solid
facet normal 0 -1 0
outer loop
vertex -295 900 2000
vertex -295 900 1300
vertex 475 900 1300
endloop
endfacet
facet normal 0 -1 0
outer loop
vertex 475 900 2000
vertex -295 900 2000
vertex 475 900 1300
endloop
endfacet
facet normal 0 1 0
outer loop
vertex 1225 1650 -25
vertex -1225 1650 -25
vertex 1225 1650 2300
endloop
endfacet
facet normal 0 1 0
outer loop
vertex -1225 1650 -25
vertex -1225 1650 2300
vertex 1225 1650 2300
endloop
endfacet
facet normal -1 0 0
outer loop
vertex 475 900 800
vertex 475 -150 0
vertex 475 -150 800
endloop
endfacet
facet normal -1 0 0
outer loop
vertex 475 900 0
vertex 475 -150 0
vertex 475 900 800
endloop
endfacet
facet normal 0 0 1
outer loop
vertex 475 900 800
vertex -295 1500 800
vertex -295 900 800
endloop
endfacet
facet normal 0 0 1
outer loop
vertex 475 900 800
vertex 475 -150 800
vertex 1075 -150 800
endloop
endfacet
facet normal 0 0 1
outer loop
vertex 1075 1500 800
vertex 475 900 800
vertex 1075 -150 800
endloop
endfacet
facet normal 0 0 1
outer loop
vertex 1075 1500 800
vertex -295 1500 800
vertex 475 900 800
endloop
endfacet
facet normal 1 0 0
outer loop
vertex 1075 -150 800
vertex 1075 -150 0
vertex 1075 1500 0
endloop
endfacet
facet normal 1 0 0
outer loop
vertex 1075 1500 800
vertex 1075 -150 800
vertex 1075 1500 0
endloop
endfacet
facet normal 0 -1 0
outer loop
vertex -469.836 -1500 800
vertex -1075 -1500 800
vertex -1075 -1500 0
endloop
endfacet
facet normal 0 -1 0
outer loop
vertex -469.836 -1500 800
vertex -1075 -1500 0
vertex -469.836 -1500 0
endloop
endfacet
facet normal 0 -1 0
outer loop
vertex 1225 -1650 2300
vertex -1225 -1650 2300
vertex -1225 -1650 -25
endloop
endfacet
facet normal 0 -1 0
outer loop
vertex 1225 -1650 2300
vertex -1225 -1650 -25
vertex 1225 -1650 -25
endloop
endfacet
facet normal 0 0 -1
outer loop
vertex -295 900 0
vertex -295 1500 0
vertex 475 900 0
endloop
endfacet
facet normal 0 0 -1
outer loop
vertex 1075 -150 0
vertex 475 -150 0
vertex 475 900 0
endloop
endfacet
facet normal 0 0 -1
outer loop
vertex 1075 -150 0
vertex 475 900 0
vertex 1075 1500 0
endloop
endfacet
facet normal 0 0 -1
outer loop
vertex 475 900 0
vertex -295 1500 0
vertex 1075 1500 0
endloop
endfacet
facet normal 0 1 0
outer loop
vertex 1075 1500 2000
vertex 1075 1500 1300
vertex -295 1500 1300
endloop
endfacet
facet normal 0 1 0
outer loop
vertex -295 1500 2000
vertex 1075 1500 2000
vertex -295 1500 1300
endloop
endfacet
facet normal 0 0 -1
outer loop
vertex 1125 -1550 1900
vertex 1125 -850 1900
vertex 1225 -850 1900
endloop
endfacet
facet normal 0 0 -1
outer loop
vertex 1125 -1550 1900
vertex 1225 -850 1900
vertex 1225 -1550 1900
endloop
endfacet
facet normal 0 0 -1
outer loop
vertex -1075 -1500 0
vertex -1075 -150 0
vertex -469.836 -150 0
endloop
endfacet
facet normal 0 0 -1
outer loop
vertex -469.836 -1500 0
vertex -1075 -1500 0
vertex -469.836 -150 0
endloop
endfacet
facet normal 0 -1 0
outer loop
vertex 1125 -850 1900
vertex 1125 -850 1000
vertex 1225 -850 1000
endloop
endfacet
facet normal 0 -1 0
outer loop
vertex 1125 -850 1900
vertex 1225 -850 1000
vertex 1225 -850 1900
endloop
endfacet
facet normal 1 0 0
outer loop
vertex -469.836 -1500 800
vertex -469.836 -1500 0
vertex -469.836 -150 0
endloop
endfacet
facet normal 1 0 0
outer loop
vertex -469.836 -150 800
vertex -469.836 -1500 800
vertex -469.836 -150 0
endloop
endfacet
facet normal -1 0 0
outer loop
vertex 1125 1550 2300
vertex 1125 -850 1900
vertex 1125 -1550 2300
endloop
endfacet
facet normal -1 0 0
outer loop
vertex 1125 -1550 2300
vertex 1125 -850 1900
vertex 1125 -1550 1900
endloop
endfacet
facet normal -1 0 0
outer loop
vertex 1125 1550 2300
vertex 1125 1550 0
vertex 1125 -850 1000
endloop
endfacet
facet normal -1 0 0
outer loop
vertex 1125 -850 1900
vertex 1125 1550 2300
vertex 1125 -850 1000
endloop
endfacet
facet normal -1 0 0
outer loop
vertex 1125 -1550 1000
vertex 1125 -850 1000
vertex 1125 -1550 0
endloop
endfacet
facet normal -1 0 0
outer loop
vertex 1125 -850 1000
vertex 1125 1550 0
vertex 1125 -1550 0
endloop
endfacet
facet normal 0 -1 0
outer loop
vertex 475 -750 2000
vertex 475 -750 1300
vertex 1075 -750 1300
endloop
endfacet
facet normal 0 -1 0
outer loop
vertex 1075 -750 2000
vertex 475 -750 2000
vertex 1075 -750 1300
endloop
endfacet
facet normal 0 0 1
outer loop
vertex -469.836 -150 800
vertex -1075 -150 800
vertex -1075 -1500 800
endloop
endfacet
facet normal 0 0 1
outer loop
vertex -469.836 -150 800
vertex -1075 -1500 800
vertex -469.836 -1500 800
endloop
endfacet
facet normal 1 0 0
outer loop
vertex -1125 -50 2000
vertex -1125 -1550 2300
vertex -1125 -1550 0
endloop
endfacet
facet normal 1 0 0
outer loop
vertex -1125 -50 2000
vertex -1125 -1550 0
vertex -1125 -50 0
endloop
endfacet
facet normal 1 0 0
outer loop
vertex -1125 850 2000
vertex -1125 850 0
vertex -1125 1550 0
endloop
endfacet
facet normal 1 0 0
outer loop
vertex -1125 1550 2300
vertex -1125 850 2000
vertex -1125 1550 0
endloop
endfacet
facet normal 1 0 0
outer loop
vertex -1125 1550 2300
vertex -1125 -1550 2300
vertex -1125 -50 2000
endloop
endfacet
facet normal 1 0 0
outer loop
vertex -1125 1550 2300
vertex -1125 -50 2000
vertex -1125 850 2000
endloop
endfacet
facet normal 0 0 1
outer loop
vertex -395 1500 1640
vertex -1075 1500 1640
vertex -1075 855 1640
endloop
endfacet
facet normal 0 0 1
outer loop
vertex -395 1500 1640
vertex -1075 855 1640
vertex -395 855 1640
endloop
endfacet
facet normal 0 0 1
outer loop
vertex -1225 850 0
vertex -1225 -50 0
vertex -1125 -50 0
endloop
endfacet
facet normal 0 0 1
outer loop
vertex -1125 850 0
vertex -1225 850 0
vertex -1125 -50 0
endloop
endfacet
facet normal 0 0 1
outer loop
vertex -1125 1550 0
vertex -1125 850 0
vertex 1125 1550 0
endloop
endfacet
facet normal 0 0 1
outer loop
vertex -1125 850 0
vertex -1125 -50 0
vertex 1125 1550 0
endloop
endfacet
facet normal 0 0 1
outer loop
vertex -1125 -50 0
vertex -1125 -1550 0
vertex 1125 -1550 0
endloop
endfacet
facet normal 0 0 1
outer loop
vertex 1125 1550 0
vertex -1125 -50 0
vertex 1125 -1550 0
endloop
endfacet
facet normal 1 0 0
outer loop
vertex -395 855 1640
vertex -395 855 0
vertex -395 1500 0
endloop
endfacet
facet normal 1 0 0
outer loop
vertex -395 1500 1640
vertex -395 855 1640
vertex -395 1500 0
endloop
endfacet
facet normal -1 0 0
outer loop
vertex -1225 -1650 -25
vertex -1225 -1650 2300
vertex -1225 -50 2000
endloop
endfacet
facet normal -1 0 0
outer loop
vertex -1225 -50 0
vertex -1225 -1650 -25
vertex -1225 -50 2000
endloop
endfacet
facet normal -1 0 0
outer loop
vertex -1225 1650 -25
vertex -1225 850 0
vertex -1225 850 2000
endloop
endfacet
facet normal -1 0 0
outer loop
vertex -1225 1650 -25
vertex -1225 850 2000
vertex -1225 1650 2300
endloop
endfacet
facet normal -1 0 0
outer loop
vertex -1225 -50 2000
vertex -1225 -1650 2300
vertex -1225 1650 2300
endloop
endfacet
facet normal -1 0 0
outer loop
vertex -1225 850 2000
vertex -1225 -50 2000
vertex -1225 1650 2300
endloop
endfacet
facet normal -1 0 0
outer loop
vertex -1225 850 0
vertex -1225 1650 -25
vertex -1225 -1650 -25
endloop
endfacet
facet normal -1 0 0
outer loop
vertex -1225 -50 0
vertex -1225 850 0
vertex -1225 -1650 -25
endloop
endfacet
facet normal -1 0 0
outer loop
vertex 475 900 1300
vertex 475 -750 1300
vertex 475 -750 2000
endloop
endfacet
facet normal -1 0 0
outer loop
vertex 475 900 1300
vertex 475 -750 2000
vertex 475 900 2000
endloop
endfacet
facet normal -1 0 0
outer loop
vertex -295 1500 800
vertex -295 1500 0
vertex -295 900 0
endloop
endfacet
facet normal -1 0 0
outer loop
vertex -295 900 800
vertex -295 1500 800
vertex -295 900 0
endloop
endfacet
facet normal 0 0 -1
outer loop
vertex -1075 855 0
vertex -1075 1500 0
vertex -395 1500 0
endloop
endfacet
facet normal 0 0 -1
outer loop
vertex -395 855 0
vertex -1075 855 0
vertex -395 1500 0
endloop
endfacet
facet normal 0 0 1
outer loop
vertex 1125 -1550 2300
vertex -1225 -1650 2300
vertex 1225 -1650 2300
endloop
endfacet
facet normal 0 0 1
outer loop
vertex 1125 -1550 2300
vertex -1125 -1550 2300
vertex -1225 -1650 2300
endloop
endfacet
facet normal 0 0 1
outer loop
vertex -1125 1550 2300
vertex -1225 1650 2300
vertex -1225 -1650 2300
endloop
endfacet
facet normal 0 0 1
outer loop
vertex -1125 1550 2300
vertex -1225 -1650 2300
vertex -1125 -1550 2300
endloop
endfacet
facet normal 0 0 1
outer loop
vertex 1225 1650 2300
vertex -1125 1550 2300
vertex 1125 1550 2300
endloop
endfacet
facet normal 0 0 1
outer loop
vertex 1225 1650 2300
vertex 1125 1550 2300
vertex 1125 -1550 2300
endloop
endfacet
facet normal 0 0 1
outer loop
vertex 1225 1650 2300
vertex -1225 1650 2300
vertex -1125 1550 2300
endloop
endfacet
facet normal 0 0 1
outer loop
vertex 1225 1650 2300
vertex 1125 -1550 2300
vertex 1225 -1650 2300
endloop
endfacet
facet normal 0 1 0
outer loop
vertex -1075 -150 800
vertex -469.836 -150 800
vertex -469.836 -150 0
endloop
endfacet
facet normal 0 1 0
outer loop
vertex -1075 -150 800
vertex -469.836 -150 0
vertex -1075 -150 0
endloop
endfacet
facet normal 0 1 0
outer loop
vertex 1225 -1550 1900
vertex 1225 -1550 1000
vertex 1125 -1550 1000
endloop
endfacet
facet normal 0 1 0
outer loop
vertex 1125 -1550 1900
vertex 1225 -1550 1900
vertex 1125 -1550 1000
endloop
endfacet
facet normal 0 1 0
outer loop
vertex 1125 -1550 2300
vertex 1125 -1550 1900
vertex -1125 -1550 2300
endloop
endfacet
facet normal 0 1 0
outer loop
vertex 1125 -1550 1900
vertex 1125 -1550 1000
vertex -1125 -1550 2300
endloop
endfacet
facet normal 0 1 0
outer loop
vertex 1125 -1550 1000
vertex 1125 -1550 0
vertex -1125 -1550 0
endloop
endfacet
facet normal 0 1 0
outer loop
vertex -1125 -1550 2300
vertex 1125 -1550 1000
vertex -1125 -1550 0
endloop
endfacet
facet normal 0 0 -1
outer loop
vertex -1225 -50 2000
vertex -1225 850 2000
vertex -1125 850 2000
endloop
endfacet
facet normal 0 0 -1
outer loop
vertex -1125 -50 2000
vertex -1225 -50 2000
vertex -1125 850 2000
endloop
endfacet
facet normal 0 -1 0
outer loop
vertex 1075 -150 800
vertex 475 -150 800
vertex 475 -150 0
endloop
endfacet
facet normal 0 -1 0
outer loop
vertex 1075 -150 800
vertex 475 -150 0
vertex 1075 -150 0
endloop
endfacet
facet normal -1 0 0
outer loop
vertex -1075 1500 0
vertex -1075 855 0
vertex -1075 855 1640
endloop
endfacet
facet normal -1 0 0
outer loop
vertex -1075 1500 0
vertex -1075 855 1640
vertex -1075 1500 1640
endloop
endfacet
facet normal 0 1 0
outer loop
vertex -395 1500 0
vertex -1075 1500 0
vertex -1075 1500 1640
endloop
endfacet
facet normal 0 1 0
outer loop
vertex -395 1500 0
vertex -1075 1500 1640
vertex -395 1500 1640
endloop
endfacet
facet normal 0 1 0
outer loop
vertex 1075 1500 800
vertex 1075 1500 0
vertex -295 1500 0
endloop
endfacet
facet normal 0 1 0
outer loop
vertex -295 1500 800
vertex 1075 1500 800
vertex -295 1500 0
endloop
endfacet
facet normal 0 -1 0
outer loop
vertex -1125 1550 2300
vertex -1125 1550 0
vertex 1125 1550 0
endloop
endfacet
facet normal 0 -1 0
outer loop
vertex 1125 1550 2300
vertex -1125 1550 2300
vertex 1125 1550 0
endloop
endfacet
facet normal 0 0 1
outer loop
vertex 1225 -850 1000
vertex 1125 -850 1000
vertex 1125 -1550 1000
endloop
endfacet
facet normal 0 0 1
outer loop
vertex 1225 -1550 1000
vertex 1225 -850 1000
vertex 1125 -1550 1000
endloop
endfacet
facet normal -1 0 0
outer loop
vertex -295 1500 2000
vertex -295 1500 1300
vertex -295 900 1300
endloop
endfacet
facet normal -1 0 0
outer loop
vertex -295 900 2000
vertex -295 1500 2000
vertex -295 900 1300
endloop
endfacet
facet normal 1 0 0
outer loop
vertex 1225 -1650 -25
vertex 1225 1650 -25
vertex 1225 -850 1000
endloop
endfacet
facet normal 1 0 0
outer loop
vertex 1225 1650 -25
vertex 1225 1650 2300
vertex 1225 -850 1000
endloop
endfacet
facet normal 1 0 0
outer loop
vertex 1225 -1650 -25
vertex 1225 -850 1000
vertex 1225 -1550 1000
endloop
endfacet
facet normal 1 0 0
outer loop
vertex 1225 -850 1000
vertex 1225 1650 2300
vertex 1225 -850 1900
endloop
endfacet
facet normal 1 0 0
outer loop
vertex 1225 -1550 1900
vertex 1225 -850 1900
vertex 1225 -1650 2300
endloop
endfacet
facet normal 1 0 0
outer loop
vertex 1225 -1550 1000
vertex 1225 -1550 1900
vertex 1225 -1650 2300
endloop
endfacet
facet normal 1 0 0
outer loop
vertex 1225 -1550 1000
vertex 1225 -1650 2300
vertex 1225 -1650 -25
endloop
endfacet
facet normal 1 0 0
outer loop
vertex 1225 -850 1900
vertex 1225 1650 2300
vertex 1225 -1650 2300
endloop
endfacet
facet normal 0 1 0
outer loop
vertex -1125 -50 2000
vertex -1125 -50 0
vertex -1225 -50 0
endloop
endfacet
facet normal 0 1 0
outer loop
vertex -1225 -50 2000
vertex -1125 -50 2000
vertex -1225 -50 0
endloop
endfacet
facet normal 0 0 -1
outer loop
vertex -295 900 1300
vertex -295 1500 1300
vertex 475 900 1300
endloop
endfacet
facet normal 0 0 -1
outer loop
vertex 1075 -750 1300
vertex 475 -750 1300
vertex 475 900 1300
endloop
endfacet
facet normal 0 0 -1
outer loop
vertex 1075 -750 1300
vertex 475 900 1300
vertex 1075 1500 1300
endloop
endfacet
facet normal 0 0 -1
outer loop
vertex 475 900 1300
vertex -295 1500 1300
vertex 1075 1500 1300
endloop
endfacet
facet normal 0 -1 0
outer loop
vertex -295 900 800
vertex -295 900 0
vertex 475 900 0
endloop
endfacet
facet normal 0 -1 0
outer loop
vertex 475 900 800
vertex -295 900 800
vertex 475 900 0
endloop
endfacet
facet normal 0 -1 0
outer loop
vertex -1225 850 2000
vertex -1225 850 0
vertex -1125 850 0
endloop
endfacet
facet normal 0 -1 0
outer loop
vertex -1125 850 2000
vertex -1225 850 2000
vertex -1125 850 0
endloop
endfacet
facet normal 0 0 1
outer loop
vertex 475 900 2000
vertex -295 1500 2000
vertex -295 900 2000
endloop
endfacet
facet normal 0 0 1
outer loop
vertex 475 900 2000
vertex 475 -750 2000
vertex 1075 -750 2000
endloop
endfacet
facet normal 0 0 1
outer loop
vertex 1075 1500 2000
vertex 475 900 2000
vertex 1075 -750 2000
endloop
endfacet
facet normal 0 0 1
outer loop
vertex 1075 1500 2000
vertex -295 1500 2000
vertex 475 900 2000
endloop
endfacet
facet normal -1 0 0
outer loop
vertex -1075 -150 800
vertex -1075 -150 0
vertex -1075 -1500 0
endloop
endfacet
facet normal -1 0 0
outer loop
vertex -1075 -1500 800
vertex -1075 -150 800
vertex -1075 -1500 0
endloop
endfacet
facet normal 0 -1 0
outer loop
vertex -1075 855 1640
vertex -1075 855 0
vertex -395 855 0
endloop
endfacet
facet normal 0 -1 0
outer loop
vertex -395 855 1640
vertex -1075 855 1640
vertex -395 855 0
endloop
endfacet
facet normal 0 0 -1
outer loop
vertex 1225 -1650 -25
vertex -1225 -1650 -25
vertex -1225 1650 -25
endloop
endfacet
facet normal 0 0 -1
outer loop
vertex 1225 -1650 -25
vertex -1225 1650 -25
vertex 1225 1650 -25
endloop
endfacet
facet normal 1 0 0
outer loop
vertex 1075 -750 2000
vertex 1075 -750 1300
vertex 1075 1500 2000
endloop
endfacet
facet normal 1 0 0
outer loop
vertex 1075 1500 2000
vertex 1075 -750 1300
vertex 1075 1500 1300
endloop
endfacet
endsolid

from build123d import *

# Parameters (mm, degrees)
F1_DEPTH  = 2300
F2_W      = 700
F2_H      = 900
F3_DEPTH  = 512.67833
F4_W      = 2450
F4_H      = 3300
F5_DEPTH  = 25
F6_W      = 100
F6_H      = 900
F7_DEPTH  = 300
F8_W      = 680
F8_H      = 645
F9_DEPTH  = 1640
F10_W     = 600
F10_H     = 2400
F11_DEPTH = 800
F13_W     = 600
F13_H     = 1650
F14_DEPTH = 700
F15_W     = 600
F15_H     = 1150
F16_DEPTH = 800
F19_W     = 600
F19_H     = 1350
F20_DEPTH = 800


# Not quite as in the source:
# - a feature of the source that left no trace in its solid (it failed there, or was rolled back) is left out


with BuildPart() as f1:
    # F0 (on Top) → F1 (new body)
    with BuildSketch(Plane.XY):
        Polygon((-1125, 1550), (1125, 1550), (1125, -1550), (-1125, -1550), (-1125, -50), (-1225, -50), (-1225, -1650), (1225, -1650), (1225, 1650), (-1225, 1650), (-1225, 850), (-1125, 850), align=None)
    extrude(amount=F1_DEPTH)

    # F2 (on face) → F3 (cut)
    with BuildSketch(Plane(origin=(1125, 0, 0), x_dir=(0, -1, 0), z_dir=(-1, 0, 0))):
        with Locations((1200, 1450)):
            Rectangle(F2_W, F2_H)
    extrude(amount=-F3_DEPTH, mode=Mode.SUBTRACT)

    # F4 (on face) → F5 (join)
    with BuildSketch(Plane(origin=(0, 0, 0), x_dir=(1, 0, 0), z_dir=(0, 0, -1))):
        Rectangle(F4_W, F4_H)
    extrude(amount=F5_DEPTH)

    # F6 (on face) → F7 (join)
    with BuildSketch(Plane.XY.offset(2300)):
        with Locations((-1175, 400)):
            Rectangle(F6_W, F6_H)
    extrude(amount=-F7_DEPTH)


with BuildPart() as f9:
    # F8 (on face) → F9 (new body)
    with BuildSketch(Plane.XY):
        with Locations((-735, 1177.5)):
            Rectangle(F8_W, F8_H)
    extrude(amount=F9_DEPTH)


with BuildPart() as f11:
    # F10 (on face) → F11 (new body)
    with BuildSketch(Plane.XY):
        Polygon((1075, 1500), (-295, 1500), (-295, 900), (475, 900), (1075, 900), align=None)
        with Locations((775, -300)):
            Rectangle(F10_W, F10_H)
    extrude(amount=F11_DEPTH)

    # F19 (on face) → F20 (cut)
    with BuildSketch(Plane.XY.offset(800)):
        with Locations((775, -825)):
            Rectangle(F19_W, F19_H)
    extrude(amount=-F20_DEPTH, mode=Mode.SUBTRACT)


with BuildPart() as f14:
    # F13 (on offset) → F14 (new body)
    with BuildSketch(Plane.XY.offset(1300)):
        Polygon((1075, 900), (1075, 1500), (-295, 1500), (-295, 900), (475, 900), align=None)
        with Locations((775, 75)):
            Rectangle(F13_W, F13_H)
    extrude(amount=F14_DEPTH)


with BuildPart() as f16:
    # F15 (on face) → F16 (new body)
    with BuildSketch(Plane.XY):
        Polygon((-1075, -150), (-1075, -350), (-475, -350), (-475, -1500), (-469.8359668255, -1500), (-469.8359668255, -150), align=None)
        with Locations((-775, -925)):
            Rectangle(F15_W, F15_H)
    extrude(amount=F16_DEPTH)


solid = Compound([f1.part, f9.part, f11.part, f14.part, f16.part])
